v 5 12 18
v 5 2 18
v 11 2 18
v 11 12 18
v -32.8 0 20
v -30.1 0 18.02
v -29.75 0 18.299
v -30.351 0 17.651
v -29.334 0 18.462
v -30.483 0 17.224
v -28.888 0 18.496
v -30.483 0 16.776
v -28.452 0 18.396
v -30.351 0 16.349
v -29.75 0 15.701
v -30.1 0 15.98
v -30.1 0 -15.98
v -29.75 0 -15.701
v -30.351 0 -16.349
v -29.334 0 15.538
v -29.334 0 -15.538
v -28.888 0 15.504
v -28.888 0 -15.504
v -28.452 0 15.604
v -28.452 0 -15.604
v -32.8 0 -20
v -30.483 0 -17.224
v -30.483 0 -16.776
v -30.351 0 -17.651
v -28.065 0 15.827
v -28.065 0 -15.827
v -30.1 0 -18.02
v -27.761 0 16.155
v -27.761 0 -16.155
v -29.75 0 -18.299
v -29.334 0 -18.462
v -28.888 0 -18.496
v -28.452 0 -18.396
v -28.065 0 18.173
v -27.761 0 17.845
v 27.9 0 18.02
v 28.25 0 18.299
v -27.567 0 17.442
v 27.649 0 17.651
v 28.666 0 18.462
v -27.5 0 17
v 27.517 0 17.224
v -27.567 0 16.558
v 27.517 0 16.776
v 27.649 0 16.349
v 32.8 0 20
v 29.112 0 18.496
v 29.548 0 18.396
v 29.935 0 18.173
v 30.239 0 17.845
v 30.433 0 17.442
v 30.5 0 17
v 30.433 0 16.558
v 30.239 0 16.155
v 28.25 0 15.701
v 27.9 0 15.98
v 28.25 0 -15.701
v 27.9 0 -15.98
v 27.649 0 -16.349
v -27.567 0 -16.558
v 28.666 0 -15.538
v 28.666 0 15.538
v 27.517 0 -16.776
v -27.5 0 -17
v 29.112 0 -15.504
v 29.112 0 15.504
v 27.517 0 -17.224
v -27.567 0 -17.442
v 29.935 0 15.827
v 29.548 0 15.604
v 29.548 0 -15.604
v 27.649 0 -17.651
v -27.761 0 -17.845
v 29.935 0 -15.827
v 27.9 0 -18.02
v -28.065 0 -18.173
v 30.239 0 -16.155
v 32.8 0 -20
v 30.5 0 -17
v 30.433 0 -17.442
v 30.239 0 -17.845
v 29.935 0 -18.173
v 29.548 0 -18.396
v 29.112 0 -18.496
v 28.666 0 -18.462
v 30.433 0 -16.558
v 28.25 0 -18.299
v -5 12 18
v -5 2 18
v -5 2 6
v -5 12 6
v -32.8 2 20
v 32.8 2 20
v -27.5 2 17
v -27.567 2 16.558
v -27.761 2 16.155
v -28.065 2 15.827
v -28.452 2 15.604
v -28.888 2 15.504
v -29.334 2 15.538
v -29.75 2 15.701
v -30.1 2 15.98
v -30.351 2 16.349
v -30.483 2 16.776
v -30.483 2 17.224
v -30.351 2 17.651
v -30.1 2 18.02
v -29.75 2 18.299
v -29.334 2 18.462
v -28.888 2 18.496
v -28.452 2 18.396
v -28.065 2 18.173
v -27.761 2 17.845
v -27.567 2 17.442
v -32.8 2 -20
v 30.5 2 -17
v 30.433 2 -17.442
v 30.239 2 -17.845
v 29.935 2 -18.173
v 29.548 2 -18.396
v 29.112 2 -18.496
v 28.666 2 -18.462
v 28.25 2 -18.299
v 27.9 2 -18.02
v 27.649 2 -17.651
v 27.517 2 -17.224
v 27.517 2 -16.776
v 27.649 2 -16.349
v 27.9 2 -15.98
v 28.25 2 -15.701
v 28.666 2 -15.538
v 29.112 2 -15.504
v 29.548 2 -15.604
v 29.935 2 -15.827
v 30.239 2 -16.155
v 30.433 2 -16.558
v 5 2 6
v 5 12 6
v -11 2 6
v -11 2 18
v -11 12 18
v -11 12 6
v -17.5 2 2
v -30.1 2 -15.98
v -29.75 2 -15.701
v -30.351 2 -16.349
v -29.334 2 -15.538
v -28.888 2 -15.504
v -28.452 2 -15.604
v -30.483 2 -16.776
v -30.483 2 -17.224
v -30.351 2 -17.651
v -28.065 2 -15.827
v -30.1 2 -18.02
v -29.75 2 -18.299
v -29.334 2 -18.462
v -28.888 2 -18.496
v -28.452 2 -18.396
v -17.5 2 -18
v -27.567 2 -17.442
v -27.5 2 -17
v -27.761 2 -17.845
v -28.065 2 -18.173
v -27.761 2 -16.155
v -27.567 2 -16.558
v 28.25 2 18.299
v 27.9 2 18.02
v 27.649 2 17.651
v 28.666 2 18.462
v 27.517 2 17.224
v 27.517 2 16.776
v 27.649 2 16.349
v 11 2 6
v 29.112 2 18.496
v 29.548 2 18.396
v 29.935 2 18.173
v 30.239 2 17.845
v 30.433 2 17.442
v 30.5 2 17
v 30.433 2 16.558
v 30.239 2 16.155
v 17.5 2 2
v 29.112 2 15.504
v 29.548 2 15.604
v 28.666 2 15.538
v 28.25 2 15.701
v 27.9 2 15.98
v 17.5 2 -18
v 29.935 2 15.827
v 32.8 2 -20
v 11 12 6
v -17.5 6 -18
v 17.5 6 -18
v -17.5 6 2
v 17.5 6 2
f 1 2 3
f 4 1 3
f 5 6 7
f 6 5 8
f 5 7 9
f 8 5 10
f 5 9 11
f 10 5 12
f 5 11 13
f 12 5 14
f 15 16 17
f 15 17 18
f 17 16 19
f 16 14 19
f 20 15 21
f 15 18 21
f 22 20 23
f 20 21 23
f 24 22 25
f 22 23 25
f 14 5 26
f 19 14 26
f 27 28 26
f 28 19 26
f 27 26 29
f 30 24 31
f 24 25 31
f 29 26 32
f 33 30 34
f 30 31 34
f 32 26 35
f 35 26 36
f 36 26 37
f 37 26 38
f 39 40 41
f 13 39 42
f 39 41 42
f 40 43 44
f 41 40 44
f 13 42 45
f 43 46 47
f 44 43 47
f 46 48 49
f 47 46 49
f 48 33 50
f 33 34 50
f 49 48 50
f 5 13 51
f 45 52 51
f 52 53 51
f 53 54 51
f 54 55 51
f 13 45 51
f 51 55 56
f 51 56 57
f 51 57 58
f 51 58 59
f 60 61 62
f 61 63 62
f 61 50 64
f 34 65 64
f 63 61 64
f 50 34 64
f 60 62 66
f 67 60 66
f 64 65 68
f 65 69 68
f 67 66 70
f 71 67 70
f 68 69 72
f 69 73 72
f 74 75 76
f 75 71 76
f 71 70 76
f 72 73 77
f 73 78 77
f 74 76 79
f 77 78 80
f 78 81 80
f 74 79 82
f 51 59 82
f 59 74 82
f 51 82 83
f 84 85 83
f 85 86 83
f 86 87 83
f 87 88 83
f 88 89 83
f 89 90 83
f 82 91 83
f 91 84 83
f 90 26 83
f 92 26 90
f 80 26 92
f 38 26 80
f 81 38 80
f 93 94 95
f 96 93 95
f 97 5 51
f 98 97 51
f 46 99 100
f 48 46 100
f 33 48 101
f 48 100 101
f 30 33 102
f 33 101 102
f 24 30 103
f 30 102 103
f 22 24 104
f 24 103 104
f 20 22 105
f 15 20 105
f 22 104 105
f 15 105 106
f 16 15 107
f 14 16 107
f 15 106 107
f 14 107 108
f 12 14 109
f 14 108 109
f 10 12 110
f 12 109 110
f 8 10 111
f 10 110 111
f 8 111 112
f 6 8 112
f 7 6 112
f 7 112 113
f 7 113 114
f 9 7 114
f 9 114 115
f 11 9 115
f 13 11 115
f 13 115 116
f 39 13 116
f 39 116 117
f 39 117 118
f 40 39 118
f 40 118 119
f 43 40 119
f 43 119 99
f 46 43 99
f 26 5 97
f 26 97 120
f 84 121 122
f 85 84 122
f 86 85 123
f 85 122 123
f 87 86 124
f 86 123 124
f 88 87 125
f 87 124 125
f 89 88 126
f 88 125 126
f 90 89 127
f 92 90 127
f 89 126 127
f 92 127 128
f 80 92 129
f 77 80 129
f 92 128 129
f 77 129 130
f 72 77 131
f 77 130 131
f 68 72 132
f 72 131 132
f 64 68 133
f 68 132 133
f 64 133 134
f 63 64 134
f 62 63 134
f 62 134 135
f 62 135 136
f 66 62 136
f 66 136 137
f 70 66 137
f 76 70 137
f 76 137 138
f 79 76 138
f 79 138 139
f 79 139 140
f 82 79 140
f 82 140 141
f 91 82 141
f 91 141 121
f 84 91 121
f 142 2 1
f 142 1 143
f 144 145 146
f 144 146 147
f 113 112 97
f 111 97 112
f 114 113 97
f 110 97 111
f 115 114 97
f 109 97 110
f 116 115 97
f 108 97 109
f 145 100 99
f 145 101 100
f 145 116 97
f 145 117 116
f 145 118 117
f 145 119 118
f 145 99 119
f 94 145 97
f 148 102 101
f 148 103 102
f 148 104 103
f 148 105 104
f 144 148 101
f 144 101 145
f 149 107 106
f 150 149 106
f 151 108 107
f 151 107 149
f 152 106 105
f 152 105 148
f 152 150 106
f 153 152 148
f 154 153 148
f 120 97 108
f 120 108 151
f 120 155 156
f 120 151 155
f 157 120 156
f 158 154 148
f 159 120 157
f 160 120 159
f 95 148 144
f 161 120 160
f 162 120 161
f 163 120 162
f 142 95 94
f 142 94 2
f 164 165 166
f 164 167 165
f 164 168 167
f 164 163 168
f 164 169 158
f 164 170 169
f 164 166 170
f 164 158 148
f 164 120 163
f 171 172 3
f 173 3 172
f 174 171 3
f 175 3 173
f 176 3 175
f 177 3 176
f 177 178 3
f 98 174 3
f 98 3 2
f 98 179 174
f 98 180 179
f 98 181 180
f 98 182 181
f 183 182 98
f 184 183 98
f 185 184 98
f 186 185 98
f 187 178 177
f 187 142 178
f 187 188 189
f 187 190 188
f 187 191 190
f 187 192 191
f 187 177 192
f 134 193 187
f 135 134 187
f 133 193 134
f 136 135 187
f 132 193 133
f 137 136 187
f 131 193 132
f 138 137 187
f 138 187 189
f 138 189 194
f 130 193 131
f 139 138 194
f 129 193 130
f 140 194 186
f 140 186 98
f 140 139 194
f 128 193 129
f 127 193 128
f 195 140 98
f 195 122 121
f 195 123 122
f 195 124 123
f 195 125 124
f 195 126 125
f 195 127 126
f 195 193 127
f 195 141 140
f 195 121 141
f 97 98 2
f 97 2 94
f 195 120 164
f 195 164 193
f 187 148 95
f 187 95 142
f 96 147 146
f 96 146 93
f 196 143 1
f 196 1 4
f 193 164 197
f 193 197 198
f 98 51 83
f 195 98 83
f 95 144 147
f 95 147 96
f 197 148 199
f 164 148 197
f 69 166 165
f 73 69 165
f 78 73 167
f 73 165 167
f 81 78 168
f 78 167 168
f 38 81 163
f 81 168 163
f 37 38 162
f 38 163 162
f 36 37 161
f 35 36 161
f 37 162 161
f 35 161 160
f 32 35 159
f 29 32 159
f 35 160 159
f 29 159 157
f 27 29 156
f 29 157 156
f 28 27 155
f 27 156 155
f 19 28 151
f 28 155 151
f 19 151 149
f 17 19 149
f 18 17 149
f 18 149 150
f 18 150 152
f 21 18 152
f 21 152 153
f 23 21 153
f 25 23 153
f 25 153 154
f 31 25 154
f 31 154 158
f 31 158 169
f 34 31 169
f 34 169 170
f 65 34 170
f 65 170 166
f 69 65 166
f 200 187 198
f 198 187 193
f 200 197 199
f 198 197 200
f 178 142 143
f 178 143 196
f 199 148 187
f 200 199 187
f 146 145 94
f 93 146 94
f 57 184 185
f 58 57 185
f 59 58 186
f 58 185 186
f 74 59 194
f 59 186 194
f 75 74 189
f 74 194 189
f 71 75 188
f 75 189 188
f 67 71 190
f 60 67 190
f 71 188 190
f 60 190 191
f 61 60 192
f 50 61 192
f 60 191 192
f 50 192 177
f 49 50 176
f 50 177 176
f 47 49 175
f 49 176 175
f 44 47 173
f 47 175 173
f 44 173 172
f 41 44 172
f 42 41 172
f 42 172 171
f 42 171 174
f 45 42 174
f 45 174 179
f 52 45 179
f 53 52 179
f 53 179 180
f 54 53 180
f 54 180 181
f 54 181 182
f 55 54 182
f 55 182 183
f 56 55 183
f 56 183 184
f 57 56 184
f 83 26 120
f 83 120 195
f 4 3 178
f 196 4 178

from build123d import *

# Parameters (mm, degrees)
SKETCH1_W           = 65.6
SKETCH1_H           = 40
BOSS_EXTRUDE1_DEPTH = 2
SKETCH2_R           = 1.5
CUT_EXTRUDE1_DEPTH  = 3
SKETCH3_W           = 35
SKETCH3_H           = 20
BOSS_EXTRUDE2_DEPTH = 4
SKETCH4_W           = 6
SKETCH4_H           = 12
BOSS_EXTRUDE3_DEPTH = 10


with BuildPart() as part:
    # Sketch1 → Boss-Extrude1 (new body)
    with BuildSketch(Plane(origin=(0, 0, 0), x_dir=(1, 0, 0), z_dir=(0, 1, 0))):
        Rectangle(SKETCH1_W, SKETCH1_H)
    extrude(amount=BOSS_EXTRUDE1_DEPTH)

    # Sketch2 → Cut-Extrude1 (cut, through all)
    with BuildSketch(Plane(origin=(0, 2, 0), x_dir=(1, 0, 0), z_dir=(0, 1, 0))):
        with Locations((-29, 17)):
            Circle(SKETCH2_R)
        with Locations((29, 17)):
            Circle(SKETCH2_R)
        with Locations((29, -17)):
            Circle(SKETCH2_R)
        with Locations((-29, -17)):
            Circle(SKETCH2_R)
    extrude(amount=-CUT_EXTRUDE1_DEPTH, mode=Mode.SUBTRACT)

    # Sketch3 → Boss-Extrude2 (add)
    with BuildSketch(Plane(origin=(0, 2, 0), x_dir=(1, 0, 0), z_dir=(0, 1, 0))):
        with Locations((0, 8)):
            Rectangle(SKETCH3_W, SKETCH3_H)
    extrude(amount=BOSS_EXTRUDE2_DEPTH)

    # Sketch4 → Boss-Extrude3 (add)
    with BuildSketch(Plane(origin=(0, 2, 0), x_dir=(1, 0, 0), z_dir=(0, 1, 0))):
        with Locations((-8, -12)):
            Rectangle(SKETCH4_W, SKETCH4_H)
        with Locations((8, -12)):
            Rectangle(SKETCH4_W, SKETCH4_H)
    extrude(amount=BOSS_EXTRUDE3_DEPTH)


solid = part.part
